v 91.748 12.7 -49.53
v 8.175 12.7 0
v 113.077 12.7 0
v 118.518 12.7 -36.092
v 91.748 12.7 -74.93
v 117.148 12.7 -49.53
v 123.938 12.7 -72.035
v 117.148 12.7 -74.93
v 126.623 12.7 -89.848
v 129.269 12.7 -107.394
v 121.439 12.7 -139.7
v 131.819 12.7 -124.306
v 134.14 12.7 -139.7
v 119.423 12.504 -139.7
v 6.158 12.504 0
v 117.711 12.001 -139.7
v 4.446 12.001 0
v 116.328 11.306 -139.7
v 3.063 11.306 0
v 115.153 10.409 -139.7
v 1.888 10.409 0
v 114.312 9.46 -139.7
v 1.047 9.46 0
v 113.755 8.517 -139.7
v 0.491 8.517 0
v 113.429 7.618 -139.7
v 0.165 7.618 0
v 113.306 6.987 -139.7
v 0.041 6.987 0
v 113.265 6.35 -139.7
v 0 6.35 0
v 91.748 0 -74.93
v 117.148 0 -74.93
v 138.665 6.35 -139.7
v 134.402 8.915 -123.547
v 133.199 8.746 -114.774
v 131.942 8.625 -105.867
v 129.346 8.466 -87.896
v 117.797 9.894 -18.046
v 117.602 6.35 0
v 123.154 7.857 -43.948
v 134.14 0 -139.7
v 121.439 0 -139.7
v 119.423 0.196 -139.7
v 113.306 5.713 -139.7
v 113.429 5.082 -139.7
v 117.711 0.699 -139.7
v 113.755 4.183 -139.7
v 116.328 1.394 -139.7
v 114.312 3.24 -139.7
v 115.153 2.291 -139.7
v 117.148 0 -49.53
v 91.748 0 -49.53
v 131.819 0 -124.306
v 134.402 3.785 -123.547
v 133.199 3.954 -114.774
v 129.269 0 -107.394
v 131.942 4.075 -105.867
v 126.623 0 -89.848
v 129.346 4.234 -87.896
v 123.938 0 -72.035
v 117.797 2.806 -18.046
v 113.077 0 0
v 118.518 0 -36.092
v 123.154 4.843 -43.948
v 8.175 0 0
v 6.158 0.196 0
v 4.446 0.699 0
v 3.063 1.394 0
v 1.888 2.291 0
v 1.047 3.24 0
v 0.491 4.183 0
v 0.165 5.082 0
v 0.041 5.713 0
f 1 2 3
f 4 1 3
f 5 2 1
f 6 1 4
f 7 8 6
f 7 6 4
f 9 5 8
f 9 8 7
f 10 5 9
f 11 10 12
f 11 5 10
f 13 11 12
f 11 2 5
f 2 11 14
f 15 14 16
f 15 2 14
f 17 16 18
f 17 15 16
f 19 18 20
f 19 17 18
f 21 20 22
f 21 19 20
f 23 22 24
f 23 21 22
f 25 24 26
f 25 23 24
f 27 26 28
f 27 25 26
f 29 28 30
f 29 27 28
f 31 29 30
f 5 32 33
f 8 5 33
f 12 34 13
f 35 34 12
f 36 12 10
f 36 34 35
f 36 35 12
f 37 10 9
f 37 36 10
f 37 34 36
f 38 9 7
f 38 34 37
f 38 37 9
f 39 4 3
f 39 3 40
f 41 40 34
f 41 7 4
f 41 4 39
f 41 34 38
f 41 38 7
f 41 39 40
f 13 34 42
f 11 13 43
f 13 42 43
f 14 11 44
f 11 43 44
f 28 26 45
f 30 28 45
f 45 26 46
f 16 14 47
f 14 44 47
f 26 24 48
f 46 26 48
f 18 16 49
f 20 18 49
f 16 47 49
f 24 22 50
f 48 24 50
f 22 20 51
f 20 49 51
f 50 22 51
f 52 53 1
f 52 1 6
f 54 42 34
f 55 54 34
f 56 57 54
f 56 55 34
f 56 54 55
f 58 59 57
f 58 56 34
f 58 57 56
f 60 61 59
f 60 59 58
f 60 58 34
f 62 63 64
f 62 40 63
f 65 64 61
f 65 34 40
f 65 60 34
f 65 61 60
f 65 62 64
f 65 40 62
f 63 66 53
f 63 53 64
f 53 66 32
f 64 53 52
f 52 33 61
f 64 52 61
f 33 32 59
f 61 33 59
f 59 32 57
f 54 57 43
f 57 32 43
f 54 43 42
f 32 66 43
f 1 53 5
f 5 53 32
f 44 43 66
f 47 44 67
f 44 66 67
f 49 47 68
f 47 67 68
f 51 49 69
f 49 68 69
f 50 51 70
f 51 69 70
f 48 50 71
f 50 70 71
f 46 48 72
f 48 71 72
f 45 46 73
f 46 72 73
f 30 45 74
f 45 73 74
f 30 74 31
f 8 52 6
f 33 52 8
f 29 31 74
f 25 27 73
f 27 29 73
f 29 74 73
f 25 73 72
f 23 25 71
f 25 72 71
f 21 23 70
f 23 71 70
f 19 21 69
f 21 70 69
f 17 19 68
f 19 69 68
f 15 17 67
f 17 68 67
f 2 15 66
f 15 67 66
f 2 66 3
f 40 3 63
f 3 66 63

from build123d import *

# Parameters (mm, degrees)
BOSS_EXTRUDE1_DEPTH          = 12.7
SERVO_HOLE_DEPTH             = 224.084518592
SERVO_HOLE_DEPTH_BACK        = 224.084518592
SKETCH3_W                    = 25.4
SKETCH3_H                    = 25.4
FILLET1_R                    = 6.35
CUT_EXTRUDE1_DEPTH           = 224.084518592
CUT_EXTRUDE1_TAPER           = -7
CUT_EXTRUDE1_OTHER_WAY_DEPTH = 224.084518592


with BuildPart() as part:
    # Sketch1 → Boss-Extrude1 (new body)
    with BuildSketch(Plane(origin=(0, 0, 0), x_dir=(1, 0, 0), z_dir=(0, 1, 0))):
        Polygon((128.31424077, 139.7), (37.592, 0), (150.368, 0), (173.46274077, 139.7), align=None)
        Polygon((113.26474077, 139.7), (0, 0), (37.592, 0), (128.31424077, 139.7), align=None)
    extrude(amount=BOSS_EXTRUDE1_DEPTH)

    # Sketch3 → servo hole (cut, two sides: drawn at the far end of the back side and taken through both)
    with BuildSketch(Plane(origin=(0, 12.7, 0), x_dir=(1, 0, 0), z_dir=(0, 1, 0)).offset(-SERVO_HOLE_DEPTH_BACK)):
        with Locations((104.447870385, 62.23)):
            Rectangle(SKETCH3_W, SKETCH3_H)
    extrude(amount=SERVO_HOLE_DEPTH + SERVO_HOLE_DEPTH_BACK, mode=Mode.SUBTRACT)

    # Fillet1
    fillet1_edges = [part.edges().sort_by_distance(p)[0] for p in [
        (56.632370385, 0, -69.85),
        (56.632370385, 12.7, -69.85),
    ]]
    fillet(fillet1_edges, radius=FILLET1_R - 0.0001)  # a hair under: the kernel refuses the full size

    # Sketch4 → Cut-Extrude1 (cut)
    with BuildSketch(Plane(origin=(0, 0, -139.7), x_dir=(-1, 0, 0), z_dir=(0, 0, -1))):
        Polygon((-134.139610484, 0), (-138.66474077, 6.35), (-134.139610484, 12.7), (-173.46274077, 12.7), (-173.46274077, 0), align=None)
    extrude(amount=-CUT_EXTRUDE1_DEPTH, taper=CUT_EXTRUDE1_TAPER, mode=Mode.SUBTRACT)

    # Sketch4 → Cut-Extrude1 other way (cut)
    with BuildSketch(Plane(origin=(0, 0, -139.7), x_dir=(-1, 0, 0), z_dir=(0, 0, -1))):
        Polygon((-134.139610484, 0), (-138.66474077, 6.35), (-134.139610484, 12.7), (-173.46274077, 12.7), (-173.46274077, 0), align=None)
    extrude(amount=CUT_EXTRUDE1_OTHER_WAY_DEPTH, mode=Mode.SUBTRACT)


solid = part.part
